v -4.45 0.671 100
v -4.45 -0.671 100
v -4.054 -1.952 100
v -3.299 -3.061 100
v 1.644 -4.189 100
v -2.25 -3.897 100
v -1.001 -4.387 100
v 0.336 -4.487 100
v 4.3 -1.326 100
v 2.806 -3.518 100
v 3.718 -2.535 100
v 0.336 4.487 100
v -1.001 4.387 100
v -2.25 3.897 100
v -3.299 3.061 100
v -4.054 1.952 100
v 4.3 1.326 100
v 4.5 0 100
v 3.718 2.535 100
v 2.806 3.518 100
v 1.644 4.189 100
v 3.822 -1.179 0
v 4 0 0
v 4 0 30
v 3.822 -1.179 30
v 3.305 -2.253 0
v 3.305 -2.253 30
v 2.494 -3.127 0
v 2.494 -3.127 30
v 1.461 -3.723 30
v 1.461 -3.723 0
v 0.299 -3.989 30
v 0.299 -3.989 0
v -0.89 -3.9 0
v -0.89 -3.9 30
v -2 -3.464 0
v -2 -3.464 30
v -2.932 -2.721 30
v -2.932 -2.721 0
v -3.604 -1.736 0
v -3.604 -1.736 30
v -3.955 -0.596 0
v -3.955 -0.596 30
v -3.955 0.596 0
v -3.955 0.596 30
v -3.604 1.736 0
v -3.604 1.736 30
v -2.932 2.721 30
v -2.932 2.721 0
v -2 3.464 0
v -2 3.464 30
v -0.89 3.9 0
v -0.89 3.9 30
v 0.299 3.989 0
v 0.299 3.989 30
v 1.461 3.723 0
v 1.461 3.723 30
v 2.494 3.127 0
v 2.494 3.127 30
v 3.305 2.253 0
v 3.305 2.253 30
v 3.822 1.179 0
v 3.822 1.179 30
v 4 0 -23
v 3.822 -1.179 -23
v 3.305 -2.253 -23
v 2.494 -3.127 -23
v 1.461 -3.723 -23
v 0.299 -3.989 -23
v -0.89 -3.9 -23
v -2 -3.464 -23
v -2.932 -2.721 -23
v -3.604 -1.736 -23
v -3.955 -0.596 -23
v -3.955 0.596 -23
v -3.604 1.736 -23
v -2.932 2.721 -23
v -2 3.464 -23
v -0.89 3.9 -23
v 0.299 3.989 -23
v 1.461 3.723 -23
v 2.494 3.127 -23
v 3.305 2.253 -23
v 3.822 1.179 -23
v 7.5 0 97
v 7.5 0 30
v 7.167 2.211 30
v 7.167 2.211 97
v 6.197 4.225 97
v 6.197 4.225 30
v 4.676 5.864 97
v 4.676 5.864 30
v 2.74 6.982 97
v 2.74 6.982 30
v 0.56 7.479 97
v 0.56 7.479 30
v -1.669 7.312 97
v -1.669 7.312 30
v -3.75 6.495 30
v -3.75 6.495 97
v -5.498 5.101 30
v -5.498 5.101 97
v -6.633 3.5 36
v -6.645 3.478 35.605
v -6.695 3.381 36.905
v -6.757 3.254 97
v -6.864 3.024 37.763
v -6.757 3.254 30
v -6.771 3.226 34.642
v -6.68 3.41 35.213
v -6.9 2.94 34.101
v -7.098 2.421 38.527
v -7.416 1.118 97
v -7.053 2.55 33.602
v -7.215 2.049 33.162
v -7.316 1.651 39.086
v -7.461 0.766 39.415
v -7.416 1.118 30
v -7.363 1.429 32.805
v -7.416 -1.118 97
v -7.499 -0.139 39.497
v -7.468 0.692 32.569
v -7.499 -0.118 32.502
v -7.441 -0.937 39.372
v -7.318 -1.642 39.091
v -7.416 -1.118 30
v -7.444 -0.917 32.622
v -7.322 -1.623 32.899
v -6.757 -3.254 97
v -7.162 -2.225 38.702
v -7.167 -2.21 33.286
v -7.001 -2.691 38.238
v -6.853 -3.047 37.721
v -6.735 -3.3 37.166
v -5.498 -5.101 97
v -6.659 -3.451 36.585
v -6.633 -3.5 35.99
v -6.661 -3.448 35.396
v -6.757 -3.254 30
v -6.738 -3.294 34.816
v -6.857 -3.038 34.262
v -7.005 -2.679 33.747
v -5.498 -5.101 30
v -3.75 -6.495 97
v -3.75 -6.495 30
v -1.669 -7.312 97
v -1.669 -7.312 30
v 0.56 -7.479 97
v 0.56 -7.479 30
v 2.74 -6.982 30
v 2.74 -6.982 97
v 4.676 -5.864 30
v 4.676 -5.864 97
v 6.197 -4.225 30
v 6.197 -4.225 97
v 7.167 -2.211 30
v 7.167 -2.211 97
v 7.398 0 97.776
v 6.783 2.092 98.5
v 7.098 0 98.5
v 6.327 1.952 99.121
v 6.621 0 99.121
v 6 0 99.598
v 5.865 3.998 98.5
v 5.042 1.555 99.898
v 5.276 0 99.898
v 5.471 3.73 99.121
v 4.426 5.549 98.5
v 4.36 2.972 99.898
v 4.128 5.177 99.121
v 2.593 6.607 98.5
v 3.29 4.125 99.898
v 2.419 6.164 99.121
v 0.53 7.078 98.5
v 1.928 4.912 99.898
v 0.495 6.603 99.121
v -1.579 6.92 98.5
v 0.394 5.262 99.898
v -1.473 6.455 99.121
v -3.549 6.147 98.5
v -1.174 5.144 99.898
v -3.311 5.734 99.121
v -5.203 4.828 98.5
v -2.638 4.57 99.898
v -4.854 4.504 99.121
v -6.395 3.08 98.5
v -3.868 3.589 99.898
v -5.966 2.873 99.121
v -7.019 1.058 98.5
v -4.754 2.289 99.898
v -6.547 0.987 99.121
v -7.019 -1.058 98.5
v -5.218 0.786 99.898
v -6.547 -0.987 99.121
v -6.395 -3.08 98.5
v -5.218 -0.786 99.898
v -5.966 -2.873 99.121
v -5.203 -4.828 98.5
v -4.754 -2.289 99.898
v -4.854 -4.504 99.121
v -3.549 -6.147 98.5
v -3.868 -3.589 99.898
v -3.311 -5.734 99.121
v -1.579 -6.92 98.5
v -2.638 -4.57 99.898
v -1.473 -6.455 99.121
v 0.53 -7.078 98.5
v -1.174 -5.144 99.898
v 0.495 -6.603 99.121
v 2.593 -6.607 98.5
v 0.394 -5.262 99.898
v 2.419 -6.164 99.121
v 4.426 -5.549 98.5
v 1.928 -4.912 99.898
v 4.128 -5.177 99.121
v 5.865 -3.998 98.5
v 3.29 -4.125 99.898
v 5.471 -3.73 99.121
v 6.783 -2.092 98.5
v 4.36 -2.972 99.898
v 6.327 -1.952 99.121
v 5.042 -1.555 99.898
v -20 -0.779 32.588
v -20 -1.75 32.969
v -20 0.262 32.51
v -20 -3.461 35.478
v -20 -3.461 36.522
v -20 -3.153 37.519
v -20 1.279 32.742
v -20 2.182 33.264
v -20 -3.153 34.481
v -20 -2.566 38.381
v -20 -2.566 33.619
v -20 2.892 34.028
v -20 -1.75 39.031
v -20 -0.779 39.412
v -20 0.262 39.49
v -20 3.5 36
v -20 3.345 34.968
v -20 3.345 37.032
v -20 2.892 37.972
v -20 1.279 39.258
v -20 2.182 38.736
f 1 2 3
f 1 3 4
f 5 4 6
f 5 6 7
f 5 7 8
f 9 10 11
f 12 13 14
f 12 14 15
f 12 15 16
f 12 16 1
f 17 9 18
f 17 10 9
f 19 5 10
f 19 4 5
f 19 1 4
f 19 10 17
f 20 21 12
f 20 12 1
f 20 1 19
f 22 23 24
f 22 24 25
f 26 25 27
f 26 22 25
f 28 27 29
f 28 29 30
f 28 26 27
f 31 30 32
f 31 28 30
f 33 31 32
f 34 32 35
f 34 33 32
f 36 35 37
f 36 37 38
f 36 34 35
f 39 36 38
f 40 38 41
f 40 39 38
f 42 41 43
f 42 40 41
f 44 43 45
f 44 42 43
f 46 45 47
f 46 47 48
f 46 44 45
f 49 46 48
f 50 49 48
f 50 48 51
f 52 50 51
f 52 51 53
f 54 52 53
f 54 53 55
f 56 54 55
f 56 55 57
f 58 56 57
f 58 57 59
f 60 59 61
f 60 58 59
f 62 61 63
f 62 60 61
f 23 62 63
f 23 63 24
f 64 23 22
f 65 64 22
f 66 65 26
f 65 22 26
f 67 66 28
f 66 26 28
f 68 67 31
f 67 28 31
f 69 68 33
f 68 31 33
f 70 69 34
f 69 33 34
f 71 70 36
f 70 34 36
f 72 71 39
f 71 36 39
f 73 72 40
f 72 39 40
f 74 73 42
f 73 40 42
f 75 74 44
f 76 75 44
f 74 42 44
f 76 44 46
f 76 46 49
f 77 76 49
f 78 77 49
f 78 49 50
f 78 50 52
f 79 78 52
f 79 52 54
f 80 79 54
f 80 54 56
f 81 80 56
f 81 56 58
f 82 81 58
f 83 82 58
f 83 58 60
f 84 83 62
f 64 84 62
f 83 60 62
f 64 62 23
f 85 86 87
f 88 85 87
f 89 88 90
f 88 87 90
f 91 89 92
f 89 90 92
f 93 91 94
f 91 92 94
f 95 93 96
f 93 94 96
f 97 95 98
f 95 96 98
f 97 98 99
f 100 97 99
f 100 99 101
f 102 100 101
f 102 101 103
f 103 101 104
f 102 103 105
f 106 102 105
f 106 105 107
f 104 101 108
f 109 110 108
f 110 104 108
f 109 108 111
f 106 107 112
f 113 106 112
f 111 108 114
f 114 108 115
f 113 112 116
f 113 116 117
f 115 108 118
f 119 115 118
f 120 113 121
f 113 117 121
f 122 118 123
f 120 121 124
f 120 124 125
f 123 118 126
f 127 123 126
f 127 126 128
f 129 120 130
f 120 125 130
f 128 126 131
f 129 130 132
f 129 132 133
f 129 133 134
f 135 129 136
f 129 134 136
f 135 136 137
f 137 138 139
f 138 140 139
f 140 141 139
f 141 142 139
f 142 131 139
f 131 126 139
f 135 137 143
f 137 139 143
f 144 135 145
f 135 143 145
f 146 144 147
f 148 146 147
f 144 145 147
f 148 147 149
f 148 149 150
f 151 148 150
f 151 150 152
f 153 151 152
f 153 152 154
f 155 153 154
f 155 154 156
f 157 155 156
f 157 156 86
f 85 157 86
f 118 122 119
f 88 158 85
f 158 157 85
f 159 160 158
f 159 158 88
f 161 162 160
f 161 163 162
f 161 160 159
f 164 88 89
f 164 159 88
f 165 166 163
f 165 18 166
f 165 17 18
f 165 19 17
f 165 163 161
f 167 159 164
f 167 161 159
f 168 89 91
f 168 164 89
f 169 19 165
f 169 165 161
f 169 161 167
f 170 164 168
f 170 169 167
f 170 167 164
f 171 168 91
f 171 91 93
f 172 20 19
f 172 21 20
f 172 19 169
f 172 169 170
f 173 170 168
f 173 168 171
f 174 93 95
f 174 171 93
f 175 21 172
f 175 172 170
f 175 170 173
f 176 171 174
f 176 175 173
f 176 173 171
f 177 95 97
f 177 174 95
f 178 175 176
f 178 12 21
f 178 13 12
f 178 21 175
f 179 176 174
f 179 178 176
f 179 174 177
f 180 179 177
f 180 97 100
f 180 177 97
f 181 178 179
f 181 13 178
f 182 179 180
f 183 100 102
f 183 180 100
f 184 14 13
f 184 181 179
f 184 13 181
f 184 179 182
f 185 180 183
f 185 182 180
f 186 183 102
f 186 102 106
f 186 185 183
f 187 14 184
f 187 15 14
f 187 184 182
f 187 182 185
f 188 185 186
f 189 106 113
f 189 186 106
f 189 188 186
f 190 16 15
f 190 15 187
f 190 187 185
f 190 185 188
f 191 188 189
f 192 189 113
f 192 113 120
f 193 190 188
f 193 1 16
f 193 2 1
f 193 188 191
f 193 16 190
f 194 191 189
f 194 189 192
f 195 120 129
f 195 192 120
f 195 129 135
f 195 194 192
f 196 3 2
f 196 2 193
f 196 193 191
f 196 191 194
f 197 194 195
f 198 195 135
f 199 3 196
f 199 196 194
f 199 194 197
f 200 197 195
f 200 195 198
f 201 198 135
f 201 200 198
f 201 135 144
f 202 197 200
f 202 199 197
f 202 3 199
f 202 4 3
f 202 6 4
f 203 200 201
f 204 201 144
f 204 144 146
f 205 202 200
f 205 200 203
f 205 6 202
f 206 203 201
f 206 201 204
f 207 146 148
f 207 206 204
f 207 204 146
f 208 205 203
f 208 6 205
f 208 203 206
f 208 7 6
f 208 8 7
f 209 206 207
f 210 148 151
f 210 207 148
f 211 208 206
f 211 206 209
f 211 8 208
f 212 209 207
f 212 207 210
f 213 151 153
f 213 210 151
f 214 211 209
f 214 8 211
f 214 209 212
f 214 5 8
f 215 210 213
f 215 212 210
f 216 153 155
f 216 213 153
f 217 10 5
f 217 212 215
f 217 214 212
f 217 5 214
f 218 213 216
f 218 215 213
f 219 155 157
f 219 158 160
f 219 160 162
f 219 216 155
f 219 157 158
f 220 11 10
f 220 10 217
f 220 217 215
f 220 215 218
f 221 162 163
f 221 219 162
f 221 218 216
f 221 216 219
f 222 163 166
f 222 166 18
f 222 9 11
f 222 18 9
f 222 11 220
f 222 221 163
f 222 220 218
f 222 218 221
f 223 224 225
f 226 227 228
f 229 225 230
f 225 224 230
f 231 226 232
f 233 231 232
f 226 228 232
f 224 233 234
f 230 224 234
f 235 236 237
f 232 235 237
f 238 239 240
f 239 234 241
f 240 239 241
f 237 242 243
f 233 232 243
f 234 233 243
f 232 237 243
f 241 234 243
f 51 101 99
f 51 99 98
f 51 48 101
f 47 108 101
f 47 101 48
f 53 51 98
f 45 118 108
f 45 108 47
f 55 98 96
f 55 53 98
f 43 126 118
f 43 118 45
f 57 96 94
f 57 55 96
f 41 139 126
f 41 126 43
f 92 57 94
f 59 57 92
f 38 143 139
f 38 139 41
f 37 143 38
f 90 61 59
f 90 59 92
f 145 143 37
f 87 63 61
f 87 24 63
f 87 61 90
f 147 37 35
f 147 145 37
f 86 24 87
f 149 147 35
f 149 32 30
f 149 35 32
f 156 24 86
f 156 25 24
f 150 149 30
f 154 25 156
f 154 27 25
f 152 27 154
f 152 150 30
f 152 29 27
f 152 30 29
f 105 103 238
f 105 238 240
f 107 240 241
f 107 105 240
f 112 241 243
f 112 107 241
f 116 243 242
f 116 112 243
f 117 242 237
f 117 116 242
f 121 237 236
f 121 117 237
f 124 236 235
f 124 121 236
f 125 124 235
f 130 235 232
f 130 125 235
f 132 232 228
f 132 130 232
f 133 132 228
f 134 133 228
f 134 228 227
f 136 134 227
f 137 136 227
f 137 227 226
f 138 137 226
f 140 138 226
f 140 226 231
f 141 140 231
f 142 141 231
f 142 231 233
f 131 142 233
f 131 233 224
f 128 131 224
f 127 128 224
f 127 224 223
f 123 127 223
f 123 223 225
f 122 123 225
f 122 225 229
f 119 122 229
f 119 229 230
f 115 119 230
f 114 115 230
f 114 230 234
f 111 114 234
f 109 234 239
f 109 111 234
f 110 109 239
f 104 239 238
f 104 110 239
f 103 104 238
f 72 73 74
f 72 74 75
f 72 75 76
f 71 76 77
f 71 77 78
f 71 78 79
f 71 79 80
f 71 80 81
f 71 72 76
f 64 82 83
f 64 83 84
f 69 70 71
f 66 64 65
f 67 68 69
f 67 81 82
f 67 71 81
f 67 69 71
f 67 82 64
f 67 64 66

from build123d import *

# Parameters (mm, degrees)
F0_R      = 7.5
F1_DEPTH  = 100
F2_R      = 3
F3_R      = 7.5
F3_R_2    = 4
F4_DEPTH  = 30
F5_R      = 3.5
F6_DEPTH  = 20
F1_FACE_R = 4
F7_DEPTH  = 23


with BuildPart() as f1:
    # F0 (on Top) → F1 (new body)
    with BuildSketch(Plane.XY):
        Circle(F0_R)
    extrude(amount=F1_DEPTH)

    # F2
    f2_edges = [f1.edges().sort_by_distance(p)[0] for p in [
        (-7.5, 0, 100),
    ]]
    fillet(f2_edges, radius=F2_R)

    # F3 (on face) → F4 (cut)
    with BuildSketch(Plane(origin=(0, 0, 0), x_dir=(1, 0, 0), z_dir=(0, 0, -1))):
        Circle(F3_R)
        Circle(F3_R_2, mode=Mode.SUBTRACT)
    extrude(amount=-F4_DEPTH, mode=Mode.SUBTRACT)

    # F5 (on Right) → F6 (join)
    with BuildSketch(Plane.YZ):
        with Locations((0, 36)):
            Circle(F5_R)
    extrude(amount=-F6_DEPTH)

    # F1_face (on face) → F7 (join)
    with BuildSketch(Plane(origin=(0, 0, 0), x_dir=(1, 0, 0), z_dir=(0, 0, -1))):
        Circle(F1_FACE_R)
    extrude(amount=F7_DEPTH)


solid = f1.part
